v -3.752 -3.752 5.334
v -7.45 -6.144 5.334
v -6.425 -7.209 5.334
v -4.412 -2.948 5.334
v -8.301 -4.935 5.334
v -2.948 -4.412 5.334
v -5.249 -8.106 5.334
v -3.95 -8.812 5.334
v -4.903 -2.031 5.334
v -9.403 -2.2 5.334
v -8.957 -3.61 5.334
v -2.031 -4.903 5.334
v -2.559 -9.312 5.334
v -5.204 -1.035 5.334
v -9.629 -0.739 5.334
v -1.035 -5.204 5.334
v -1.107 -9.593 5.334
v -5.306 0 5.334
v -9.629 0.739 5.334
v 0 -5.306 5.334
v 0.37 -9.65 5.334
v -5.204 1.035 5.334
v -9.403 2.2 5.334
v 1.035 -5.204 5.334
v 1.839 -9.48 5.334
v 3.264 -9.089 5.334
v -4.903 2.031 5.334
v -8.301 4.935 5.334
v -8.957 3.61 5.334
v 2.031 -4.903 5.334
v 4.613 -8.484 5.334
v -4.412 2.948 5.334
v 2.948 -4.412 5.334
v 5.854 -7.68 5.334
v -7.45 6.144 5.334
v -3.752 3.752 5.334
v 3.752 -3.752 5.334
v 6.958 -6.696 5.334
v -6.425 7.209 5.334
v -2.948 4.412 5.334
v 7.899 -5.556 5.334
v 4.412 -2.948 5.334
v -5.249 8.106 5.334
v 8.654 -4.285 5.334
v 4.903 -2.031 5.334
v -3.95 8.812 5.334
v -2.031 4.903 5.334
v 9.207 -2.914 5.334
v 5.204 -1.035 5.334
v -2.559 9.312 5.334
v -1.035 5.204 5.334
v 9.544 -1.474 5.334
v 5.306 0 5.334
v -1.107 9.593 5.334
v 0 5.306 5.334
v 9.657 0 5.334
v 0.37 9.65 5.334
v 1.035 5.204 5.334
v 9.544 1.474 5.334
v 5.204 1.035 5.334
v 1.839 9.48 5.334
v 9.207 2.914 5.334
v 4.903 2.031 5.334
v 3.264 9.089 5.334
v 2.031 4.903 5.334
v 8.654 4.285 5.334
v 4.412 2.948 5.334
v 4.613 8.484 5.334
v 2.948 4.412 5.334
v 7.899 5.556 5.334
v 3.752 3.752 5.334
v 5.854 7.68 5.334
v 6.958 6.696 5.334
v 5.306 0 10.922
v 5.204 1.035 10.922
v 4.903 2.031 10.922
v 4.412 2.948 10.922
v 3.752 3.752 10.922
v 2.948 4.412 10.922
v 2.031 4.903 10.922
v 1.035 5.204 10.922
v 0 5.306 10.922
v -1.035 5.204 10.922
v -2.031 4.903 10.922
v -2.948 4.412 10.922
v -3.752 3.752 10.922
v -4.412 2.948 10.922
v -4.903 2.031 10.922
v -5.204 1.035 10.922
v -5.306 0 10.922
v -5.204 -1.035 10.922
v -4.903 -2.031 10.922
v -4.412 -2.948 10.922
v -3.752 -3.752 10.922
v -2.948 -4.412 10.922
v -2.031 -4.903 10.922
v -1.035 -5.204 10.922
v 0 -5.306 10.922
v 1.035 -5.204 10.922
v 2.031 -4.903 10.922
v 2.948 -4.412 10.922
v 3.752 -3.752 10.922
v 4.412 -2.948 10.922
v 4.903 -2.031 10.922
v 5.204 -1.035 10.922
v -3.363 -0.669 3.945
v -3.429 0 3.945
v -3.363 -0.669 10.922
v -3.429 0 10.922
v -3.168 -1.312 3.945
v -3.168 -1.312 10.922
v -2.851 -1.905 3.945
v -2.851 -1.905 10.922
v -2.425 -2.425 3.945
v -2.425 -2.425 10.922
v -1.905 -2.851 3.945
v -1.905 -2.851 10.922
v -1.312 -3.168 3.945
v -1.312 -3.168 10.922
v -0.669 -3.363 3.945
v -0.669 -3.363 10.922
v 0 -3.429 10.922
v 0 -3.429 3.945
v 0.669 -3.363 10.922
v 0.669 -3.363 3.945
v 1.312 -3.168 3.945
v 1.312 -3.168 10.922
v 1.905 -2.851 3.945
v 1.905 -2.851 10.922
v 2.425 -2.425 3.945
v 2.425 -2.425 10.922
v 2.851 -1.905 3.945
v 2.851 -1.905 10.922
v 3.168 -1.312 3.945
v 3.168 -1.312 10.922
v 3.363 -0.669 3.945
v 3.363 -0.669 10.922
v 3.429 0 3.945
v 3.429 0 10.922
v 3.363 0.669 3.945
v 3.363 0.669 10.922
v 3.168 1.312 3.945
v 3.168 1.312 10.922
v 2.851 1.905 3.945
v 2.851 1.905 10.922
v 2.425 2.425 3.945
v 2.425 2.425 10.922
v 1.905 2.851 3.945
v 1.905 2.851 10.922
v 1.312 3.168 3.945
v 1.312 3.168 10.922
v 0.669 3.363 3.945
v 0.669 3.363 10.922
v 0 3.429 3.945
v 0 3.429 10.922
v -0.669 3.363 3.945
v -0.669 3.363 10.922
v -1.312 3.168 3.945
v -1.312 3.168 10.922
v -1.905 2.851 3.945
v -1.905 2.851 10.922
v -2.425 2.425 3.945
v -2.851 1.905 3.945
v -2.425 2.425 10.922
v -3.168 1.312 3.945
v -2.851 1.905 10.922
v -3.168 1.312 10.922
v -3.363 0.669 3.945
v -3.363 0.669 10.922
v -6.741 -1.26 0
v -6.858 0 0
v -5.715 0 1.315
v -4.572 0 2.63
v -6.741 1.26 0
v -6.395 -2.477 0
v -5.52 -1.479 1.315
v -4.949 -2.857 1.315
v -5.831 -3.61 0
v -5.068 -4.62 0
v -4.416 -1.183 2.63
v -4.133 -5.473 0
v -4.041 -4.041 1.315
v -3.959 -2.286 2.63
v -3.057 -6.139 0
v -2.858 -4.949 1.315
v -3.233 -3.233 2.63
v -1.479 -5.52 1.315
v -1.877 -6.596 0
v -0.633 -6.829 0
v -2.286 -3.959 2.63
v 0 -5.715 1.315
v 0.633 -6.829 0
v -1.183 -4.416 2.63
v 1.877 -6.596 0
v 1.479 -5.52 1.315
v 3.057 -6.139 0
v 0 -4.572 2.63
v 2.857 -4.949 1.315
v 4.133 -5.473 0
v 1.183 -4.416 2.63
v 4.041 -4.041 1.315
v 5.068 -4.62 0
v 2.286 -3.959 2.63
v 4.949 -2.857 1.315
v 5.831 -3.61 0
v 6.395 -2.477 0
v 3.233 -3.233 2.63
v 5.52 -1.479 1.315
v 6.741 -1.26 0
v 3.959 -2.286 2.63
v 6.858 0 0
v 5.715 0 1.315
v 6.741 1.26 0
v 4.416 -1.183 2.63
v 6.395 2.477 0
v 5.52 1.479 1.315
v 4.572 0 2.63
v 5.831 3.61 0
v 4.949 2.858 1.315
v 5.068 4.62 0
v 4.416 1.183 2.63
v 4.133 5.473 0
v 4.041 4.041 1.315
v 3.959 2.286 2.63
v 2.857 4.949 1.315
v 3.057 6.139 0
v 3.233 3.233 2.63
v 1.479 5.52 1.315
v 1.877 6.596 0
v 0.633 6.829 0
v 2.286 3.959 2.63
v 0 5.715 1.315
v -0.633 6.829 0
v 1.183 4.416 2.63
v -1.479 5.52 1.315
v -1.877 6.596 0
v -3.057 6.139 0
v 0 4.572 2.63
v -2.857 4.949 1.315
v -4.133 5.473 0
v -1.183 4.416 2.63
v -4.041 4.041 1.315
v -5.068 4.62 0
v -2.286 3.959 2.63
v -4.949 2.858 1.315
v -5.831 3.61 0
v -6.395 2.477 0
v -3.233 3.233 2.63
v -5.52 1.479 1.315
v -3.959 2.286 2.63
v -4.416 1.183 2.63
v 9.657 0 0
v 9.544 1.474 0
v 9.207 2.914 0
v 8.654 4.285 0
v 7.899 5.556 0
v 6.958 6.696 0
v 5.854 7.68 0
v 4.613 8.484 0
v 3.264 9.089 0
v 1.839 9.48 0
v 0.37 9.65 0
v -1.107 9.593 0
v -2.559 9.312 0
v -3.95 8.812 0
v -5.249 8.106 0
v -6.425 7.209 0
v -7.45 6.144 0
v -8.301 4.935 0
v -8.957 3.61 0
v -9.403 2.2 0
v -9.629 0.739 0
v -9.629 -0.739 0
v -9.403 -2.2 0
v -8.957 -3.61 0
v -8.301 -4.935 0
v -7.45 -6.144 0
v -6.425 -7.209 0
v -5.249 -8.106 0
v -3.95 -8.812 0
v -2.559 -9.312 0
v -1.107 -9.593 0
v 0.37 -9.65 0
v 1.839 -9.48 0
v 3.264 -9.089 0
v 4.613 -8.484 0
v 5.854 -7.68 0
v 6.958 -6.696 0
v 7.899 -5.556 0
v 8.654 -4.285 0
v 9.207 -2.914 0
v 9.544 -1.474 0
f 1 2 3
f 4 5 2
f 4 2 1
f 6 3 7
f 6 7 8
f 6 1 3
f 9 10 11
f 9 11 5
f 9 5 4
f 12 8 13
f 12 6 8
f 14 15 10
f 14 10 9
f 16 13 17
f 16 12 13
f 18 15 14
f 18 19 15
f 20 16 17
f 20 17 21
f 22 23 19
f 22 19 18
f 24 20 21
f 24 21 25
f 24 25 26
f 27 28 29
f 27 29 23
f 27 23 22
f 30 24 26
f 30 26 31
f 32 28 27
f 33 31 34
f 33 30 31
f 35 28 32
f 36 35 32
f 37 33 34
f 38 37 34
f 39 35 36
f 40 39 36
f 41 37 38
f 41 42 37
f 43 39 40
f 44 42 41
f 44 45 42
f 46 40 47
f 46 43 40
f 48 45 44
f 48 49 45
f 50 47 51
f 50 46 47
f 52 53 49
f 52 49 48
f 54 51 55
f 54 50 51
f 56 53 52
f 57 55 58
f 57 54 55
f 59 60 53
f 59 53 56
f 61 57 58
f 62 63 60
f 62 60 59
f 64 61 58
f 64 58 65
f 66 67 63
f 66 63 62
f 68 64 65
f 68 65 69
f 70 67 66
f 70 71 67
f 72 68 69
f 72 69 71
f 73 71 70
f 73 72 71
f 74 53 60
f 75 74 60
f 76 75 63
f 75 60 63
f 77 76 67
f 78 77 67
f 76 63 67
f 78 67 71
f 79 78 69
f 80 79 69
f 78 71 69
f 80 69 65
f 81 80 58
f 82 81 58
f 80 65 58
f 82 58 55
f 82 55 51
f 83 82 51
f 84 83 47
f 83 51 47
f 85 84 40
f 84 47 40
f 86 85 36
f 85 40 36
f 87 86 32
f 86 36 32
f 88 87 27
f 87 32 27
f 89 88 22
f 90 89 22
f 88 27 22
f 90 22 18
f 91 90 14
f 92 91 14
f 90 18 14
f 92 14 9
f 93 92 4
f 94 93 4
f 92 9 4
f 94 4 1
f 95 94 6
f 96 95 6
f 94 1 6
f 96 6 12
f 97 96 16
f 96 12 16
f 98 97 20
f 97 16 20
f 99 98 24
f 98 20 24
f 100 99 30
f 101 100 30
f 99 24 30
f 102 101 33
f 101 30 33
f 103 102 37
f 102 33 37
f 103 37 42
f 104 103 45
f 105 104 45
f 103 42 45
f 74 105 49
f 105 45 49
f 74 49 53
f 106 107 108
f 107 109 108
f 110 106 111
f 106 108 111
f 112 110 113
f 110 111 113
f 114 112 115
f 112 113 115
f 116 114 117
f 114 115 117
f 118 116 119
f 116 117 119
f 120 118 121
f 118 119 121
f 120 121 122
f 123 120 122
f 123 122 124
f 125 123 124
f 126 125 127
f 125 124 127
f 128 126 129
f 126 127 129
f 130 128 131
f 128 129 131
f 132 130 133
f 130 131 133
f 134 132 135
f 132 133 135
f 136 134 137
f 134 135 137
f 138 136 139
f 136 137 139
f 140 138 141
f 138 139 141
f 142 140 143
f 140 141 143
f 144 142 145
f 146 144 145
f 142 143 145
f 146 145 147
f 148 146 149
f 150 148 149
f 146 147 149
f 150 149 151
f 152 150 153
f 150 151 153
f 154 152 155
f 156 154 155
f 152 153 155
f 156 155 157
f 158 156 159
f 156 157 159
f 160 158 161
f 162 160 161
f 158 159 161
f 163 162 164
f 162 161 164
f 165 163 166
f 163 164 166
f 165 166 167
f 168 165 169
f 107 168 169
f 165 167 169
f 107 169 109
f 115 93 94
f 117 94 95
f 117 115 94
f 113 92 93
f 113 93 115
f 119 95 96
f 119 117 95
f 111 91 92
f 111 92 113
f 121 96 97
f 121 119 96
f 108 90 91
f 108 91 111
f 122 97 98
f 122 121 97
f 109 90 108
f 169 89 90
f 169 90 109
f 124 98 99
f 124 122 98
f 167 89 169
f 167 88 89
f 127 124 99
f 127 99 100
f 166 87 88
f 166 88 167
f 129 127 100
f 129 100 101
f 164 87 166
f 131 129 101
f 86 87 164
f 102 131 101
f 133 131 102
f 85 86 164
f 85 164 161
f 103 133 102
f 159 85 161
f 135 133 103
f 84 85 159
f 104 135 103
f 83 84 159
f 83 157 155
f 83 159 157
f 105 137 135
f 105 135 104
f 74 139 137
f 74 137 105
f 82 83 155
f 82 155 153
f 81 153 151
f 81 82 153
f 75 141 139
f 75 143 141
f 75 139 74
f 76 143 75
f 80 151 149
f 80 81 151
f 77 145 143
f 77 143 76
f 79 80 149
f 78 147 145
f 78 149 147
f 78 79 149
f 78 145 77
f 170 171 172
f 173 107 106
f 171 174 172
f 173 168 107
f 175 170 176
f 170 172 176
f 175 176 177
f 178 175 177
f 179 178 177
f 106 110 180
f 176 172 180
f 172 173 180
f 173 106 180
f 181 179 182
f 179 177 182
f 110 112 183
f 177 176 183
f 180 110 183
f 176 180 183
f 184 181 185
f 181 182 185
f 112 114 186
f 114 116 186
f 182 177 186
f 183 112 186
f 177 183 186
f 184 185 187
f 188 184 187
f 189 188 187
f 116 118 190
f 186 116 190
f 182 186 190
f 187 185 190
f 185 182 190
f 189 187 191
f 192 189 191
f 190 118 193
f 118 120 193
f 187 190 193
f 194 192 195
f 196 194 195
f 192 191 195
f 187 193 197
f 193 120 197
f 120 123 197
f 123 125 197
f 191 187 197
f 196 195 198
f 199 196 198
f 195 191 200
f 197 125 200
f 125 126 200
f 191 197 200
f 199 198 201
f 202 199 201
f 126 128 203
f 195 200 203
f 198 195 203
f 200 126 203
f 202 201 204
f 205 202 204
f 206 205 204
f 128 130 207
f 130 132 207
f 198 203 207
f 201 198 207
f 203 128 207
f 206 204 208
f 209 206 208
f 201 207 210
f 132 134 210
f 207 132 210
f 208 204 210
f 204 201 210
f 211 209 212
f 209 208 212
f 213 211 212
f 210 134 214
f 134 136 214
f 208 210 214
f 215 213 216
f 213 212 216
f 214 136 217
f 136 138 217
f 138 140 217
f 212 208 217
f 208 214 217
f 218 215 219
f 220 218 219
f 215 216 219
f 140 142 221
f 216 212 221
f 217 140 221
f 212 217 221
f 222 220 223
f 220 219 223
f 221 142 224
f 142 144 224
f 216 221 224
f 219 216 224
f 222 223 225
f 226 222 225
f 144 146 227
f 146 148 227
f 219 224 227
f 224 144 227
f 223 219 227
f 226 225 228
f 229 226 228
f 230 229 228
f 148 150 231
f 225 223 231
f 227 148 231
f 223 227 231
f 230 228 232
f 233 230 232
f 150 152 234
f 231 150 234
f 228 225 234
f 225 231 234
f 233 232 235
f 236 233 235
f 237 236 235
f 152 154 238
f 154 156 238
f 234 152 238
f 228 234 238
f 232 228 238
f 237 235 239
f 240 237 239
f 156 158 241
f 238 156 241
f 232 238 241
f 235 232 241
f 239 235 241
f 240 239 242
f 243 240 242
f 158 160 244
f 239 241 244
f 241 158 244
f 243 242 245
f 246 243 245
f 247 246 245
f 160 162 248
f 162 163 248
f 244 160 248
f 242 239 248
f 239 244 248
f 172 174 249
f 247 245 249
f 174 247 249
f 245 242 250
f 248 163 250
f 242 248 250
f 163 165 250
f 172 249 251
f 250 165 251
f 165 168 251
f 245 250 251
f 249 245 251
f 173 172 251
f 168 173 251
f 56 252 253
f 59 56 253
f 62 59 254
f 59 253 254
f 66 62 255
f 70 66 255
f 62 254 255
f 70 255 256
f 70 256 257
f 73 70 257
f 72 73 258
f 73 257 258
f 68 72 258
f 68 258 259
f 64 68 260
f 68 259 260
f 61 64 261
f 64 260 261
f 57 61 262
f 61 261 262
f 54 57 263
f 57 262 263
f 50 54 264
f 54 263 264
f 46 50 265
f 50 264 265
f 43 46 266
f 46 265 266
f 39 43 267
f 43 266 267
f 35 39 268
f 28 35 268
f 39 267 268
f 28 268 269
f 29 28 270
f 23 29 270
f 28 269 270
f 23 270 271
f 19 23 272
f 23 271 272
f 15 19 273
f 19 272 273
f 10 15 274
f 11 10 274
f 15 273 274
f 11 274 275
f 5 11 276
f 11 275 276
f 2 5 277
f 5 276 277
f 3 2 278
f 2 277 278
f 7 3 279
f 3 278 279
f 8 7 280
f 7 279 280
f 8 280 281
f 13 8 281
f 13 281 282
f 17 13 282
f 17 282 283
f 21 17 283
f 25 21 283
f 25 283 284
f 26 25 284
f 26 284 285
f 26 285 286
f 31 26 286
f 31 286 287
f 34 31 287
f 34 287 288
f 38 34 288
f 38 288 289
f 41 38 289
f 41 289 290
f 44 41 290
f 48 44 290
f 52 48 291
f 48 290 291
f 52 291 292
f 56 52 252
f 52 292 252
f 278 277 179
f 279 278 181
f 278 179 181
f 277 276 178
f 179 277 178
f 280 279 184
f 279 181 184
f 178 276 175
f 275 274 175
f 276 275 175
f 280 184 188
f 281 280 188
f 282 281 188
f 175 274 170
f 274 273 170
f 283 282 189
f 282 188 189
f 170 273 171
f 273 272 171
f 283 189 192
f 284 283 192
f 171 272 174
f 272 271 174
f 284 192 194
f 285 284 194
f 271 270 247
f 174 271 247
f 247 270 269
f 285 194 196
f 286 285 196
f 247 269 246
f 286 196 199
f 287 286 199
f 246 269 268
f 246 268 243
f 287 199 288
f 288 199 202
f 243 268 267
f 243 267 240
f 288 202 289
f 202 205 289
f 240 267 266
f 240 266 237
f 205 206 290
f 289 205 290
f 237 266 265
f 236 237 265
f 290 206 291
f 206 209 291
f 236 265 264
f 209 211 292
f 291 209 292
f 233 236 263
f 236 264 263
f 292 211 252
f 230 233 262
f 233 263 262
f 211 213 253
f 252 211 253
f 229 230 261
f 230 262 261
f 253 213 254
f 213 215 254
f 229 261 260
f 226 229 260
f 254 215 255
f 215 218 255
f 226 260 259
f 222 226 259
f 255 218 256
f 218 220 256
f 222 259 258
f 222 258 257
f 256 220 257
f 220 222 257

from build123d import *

# Parameters (mm, degrees)
F0_R           = 9.656937
F1_DEPTH       = 5.334
F2_R           = 5.306447
F3_DEPTH       = 5.588
F5_D           = 6.858
F5_CSINK_D     = 13.716
F5_CSINK_ANGLE = 82


with BuildPart() as f1:
    # F0 (on Top) → F1 (new body)
    with BuildSketch(Plane.XY):
        Circle(F0_R)
    extrude(amount=F1_DEPTH)

    # F2 (on face) → F3 (join)
    with BuildSketch(Plane.XY.offset(5.334)):
        Circle(F2_R)
    extrude(amount=F3_DEPTH)

    # F5 (through all)
    with Locations(Plane(origin=(0, 0, 0), x_dir=(1, 0, 0), z_dir=(0, 0, -1))):
        with Locations((0, 0)):
            CounterSinkHole(F5_D / 2, F5_CSINK_D / 2, counter_sink_angle=F5_CSINK_ANGLE)


solid = f1.part
